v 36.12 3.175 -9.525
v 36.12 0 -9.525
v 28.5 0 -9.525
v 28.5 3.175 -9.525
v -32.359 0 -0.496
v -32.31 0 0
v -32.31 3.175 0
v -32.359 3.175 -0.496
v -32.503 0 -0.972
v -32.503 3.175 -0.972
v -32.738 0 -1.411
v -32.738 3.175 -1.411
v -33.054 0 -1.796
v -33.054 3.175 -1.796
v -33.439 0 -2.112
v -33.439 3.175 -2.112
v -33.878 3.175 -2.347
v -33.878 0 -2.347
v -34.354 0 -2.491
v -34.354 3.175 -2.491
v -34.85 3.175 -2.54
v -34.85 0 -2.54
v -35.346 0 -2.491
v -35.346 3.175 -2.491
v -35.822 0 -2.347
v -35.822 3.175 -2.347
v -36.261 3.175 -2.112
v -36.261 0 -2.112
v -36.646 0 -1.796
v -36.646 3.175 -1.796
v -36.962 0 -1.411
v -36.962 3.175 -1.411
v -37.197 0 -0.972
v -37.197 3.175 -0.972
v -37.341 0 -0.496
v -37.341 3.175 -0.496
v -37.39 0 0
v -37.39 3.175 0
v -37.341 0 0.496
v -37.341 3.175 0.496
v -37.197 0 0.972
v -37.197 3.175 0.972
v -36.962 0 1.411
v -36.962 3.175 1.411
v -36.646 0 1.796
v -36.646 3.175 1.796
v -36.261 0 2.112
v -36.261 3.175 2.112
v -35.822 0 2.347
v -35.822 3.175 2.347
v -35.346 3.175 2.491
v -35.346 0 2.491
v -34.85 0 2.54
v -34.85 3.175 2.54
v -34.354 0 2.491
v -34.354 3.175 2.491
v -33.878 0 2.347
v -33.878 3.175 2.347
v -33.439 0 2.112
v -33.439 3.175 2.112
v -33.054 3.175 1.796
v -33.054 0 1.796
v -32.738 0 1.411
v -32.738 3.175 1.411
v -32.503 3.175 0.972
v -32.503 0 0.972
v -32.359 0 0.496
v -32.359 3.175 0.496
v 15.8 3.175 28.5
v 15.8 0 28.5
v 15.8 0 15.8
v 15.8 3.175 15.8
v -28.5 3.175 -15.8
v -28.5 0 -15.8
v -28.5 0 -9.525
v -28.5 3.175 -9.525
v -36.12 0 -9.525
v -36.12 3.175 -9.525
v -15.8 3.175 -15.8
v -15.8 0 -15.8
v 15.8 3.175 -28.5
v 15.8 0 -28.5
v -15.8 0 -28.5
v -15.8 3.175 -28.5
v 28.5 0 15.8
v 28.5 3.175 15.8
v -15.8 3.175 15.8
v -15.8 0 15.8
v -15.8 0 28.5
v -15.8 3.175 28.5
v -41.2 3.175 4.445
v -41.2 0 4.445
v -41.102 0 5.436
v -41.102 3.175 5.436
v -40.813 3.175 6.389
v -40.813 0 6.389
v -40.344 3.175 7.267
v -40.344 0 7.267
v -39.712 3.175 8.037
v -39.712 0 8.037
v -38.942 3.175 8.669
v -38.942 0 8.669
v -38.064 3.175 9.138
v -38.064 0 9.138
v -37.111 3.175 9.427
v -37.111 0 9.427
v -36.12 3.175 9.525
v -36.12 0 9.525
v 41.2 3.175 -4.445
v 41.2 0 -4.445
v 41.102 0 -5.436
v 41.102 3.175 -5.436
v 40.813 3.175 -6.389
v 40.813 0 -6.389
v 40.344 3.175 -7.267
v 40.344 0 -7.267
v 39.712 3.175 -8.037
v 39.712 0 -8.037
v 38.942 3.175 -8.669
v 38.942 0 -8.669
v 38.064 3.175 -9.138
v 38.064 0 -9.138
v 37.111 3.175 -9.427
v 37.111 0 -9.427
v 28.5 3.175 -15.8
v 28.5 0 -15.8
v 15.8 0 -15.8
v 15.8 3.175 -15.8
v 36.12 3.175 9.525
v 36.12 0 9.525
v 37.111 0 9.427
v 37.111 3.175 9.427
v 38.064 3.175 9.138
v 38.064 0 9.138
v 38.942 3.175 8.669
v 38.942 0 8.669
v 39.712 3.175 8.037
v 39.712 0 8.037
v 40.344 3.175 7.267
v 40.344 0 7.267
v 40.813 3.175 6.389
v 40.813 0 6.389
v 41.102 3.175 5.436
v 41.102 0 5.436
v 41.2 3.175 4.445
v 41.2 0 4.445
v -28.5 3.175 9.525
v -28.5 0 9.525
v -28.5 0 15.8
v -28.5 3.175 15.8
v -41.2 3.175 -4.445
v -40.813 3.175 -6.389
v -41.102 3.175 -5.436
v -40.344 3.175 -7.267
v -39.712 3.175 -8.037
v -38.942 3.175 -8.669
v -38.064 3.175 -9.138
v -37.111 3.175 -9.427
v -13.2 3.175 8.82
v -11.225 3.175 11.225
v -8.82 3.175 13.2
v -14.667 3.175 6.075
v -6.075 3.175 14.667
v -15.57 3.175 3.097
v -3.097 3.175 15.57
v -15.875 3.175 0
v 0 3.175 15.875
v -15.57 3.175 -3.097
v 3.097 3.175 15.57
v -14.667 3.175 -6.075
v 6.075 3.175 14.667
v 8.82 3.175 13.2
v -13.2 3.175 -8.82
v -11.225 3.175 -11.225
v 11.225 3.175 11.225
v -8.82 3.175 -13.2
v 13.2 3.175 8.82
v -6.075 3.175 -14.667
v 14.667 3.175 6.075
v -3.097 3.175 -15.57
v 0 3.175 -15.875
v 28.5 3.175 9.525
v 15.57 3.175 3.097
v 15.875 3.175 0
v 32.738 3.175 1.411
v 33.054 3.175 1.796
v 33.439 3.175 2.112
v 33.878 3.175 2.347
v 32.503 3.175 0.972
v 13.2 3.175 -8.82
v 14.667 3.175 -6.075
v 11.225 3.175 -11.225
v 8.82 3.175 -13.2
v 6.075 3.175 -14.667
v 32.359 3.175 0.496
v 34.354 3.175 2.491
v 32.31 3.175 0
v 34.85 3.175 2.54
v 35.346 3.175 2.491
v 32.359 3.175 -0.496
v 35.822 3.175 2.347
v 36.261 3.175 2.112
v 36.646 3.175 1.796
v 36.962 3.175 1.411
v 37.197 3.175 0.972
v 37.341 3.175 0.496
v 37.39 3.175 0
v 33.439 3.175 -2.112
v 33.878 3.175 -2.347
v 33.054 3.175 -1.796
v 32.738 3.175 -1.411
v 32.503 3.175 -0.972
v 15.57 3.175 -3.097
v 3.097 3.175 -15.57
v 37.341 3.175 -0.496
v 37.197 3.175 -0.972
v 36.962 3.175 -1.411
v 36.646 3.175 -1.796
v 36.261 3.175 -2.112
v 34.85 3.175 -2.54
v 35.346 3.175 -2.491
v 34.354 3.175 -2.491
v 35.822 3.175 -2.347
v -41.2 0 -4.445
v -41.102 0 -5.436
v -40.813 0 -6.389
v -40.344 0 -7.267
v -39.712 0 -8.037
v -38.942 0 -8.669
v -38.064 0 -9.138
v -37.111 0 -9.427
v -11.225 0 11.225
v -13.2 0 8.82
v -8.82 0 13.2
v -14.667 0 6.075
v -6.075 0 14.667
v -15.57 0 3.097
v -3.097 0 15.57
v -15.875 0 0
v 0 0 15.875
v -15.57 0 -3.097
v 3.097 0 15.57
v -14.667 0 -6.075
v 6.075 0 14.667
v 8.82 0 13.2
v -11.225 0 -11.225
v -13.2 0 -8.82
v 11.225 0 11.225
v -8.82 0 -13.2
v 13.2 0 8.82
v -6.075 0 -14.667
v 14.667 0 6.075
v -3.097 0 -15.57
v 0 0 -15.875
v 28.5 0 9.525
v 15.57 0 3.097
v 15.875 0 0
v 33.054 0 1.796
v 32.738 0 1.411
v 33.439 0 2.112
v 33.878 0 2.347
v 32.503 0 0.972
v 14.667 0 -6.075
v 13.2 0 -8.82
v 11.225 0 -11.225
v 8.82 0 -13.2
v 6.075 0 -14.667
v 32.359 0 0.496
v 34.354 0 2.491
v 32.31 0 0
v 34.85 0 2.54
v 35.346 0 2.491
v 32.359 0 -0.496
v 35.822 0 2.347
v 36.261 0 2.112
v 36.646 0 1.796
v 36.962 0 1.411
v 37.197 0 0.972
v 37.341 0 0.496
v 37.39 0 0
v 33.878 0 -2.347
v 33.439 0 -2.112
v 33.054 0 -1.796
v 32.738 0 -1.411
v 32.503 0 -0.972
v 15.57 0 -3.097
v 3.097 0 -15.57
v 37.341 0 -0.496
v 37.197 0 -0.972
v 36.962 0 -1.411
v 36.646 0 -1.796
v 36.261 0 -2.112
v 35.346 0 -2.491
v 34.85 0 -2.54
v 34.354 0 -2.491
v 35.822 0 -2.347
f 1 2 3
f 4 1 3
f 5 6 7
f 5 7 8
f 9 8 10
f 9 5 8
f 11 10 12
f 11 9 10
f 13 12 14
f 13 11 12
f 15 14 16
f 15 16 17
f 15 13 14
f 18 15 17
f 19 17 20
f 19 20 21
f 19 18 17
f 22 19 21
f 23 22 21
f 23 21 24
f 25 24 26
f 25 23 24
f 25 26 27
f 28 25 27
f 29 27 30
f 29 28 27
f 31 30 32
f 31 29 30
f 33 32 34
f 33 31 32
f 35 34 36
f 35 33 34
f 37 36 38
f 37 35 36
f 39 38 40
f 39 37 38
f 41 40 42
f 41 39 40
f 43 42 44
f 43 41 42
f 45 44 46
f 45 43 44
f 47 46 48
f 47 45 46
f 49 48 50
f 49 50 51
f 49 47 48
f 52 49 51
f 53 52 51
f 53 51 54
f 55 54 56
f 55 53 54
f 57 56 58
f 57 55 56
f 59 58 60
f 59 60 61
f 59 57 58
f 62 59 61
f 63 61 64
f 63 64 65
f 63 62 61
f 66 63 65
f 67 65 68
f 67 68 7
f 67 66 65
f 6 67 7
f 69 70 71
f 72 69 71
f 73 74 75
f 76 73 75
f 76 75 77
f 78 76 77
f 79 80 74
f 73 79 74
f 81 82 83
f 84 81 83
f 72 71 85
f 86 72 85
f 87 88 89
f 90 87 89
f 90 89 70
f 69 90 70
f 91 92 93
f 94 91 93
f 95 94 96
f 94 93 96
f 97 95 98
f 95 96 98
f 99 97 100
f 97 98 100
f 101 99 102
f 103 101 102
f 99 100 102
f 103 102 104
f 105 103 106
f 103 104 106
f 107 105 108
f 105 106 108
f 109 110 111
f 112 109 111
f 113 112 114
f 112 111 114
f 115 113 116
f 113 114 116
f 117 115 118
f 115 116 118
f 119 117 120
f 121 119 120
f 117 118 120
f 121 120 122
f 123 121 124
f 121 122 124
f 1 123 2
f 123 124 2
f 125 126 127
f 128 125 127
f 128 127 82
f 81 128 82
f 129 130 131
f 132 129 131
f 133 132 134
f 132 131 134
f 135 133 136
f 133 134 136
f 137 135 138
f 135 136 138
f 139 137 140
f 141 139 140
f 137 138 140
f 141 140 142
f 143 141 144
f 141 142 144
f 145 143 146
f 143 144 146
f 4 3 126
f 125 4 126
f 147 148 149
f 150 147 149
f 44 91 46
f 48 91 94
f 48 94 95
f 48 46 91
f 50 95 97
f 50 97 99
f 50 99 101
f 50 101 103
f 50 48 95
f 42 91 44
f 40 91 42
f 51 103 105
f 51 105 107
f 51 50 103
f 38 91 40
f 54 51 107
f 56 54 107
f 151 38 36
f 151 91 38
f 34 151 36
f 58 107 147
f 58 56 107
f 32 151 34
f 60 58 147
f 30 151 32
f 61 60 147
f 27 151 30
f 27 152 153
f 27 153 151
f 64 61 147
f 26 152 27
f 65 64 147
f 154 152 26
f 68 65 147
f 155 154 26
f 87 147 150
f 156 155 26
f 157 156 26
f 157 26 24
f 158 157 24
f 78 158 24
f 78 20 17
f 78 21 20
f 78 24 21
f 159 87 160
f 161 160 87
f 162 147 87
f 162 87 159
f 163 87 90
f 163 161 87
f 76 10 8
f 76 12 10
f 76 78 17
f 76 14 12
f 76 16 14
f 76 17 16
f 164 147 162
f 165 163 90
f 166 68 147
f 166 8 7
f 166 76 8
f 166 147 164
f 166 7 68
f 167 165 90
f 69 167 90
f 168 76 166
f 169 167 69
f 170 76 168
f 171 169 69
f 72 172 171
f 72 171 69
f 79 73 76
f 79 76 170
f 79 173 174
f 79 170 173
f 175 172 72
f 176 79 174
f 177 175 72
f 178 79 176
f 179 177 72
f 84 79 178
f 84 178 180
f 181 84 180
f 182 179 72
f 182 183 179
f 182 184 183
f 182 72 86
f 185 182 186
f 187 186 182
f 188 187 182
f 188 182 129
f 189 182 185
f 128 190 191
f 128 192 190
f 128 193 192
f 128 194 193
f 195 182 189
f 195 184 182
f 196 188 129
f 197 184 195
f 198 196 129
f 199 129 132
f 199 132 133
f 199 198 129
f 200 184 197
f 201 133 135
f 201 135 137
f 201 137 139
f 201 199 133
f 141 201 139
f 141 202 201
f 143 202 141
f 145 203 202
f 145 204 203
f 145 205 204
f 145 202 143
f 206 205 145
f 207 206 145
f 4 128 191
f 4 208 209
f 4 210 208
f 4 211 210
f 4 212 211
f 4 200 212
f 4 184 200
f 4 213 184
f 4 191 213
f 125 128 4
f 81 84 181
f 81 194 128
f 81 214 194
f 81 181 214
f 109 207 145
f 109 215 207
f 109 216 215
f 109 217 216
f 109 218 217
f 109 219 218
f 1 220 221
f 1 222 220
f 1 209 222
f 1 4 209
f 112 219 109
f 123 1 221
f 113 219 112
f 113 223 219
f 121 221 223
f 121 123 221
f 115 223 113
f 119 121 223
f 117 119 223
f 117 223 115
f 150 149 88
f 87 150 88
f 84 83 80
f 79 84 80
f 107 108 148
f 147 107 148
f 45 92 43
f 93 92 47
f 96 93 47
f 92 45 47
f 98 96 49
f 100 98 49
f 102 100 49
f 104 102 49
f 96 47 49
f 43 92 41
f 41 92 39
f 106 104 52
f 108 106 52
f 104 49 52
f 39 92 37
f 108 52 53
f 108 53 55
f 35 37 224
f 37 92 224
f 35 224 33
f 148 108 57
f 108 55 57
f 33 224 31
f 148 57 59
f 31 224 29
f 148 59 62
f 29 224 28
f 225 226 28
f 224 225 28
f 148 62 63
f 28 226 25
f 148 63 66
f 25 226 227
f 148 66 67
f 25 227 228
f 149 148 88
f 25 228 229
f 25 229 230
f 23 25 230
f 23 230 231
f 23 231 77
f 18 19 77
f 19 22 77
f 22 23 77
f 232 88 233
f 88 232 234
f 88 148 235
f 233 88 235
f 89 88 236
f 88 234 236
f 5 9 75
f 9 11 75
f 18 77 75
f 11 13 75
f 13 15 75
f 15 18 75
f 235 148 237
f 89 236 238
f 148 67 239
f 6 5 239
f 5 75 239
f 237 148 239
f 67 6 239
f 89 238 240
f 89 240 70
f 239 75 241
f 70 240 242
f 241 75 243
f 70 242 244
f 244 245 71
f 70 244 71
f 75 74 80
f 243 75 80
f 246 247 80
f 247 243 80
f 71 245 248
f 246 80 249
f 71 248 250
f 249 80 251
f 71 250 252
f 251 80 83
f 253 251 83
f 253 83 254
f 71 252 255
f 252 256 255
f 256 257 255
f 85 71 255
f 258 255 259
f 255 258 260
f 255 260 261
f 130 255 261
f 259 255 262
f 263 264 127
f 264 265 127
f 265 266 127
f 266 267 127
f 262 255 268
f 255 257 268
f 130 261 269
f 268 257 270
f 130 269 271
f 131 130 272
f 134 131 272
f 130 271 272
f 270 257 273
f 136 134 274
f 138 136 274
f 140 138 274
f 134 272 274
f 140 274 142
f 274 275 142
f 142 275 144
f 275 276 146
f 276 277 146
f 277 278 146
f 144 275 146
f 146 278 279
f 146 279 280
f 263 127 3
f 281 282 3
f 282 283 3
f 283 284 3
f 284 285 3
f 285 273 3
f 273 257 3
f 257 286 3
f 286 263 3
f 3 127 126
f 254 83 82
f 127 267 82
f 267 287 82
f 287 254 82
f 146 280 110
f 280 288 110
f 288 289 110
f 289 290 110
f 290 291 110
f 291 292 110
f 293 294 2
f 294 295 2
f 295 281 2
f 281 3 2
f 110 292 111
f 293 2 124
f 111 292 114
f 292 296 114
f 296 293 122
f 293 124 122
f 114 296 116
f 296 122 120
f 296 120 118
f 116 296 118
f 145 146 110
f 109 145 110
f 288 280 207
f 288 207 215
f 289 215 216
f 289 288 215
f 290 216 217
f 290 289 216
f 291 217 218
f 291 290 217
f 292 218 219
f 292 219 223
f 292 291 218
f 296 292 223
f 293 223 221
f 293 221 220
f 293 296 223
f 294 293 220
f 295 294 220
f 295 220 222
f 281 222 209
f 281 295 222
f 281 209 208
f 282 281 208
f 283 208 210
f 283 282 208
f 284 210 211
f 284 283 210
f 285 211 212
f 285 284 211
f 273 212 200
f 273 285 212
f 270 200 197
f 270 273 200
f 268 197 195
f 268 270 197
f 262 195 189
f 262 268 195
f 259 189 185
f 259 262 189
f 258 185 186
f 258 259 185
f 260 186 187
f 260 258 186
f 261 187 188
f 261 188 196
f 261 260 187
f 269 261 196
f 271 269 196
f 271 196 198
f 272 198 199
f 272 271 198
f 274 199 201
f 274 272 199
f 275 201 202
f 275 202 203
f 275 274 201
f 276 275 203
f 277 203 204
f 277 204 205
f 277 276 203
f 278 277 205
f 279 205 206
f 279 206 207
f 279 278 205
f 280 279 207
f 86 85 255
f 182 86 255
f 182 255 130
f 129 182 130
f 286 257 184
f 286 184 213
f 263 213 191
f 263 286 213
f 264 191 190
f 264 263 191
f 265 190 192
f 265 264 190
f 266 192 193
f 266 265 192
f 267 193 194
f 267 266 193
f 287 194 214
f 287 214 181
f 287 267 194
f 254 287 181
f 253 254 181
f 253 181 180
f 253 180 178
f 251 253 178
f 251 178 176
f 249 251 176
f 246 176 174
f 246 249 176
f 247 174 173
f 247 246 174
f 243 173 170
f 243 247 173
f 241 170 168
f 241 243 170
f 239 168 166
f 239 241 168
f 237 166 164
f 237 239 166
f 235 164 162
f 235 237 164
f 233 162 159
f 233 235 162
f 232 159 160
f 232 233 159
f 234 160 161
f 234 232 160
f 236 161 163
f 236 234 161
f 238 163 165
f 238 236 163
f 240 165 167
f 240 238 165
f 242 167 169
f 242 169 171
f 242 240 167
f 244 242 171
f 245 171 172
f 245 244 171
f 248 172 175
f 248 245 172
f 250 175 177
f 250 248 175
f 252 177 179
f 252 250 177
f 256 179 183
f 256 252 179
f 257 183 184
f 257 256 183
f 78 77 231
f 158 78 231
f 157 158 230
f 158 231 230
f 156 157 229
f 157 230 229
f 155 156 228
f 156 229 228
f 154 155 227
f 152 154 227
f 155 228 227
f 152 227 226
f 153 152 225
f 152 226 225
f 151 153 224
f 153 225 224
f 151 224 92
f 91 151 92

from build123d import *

# Parameters (mm, degrees)
SKETCH1_R           = 15.875
SKETCH1_R_2         = 2.54
BOSS_EXTRUDE1_DEPTH = 3.175


with BuildPart() as part:
    # Sketch1 → Boss-Extrude1 (new body)
    with BuildSketch(Plane(origin=(0, 0, 0), x_dir=(1, 0, 0), z_dir=(0, 1, 0))):
        with BuildLine():
            Line((-28.4999938, 15.7999938), (-28.4999938, 9.525))
            Line((-28.4999938, 9.525), (-36.1199938, 9.525))
            ThreePointArc((-36.1199938, 9.525), (-39.712096248, 8.037102448), (-41.1999938, 4.445))
            Line((-41.1999938, 4.445), (-41.1999938, -4.445))
            ThreePointArc((-41.1999938, -4.445), (-39.712096248, -8.037102448), (-36.1199938, -9.525))
            Line((-36.1199938, -9.525), (-28.4999938, -9.525))
            Line((-28.4999938, -9.525), (-28.4999938, -15.7999938))
            Line((-28.4999938, -15.7999938), (-15.7999938, -15.7999938))
            Line((-15.7999938, -15.7999938), (-15.7999938, -28.4999938))
            Line((-15.7999938, -28.4999938), (15.7999938, -28.4999938))
            Line((15.7999938, -28.4999938), (15.7999938, -15.7999938))
            Line((15.7999938, -15.7999938), (28.4999938, -15.7999938))
            Line((28.4999938, -15.7999938), (28.4999938, -9.525))
            Line((28.4999938, -9.525), (36.1199938, -9.525))
            ThreePointArc((36.1199938, -9.525), (39.712096248, -8.037102448), (41.1999938, -4.445))
            Line((41.1999938, -4.445), (41.1999938, 4.445))
            ThreePointArc((41.1999938, 4.445), (39.712096248, 8.037102448), (36.1199938, 9.525))
            Line((36.1199938, 9.525), (28.4999938, 9.525))
            Line((28.4999938, 9.525), (28.4999938, 15.7999938))
            Line((28.4999938, 15.7999938), (15.7999938, 15.7999938))
            Line((15.7999938, 15.7999938), (15.7999938, 28.4999938))
            Line((15.7999938, 28.4999938), (-15.7999938, 28.4999938))
            Line((-15.7999938, 28.4999938), (-15.7999938, 15.7999938))
            Line((-15.7999938, 15.7999938), (-28.4999938, 15.7999938))
        make_face()
        Circle(SKETCH1_R, mode=Mode.SUBTRACT)
        with Locations((-34.8499938, 0)):
            Circle(SKETCH1_R_2, mode=Mode.SUBTRACT)
        with Locations((34.8499938, 0)):
            Circle(SKETCH1_R_2, mode=Mode.SUBTRACT)
    extrude(amount=BOSS_EXTRUDE1_DEPTH)


solid = part.part
